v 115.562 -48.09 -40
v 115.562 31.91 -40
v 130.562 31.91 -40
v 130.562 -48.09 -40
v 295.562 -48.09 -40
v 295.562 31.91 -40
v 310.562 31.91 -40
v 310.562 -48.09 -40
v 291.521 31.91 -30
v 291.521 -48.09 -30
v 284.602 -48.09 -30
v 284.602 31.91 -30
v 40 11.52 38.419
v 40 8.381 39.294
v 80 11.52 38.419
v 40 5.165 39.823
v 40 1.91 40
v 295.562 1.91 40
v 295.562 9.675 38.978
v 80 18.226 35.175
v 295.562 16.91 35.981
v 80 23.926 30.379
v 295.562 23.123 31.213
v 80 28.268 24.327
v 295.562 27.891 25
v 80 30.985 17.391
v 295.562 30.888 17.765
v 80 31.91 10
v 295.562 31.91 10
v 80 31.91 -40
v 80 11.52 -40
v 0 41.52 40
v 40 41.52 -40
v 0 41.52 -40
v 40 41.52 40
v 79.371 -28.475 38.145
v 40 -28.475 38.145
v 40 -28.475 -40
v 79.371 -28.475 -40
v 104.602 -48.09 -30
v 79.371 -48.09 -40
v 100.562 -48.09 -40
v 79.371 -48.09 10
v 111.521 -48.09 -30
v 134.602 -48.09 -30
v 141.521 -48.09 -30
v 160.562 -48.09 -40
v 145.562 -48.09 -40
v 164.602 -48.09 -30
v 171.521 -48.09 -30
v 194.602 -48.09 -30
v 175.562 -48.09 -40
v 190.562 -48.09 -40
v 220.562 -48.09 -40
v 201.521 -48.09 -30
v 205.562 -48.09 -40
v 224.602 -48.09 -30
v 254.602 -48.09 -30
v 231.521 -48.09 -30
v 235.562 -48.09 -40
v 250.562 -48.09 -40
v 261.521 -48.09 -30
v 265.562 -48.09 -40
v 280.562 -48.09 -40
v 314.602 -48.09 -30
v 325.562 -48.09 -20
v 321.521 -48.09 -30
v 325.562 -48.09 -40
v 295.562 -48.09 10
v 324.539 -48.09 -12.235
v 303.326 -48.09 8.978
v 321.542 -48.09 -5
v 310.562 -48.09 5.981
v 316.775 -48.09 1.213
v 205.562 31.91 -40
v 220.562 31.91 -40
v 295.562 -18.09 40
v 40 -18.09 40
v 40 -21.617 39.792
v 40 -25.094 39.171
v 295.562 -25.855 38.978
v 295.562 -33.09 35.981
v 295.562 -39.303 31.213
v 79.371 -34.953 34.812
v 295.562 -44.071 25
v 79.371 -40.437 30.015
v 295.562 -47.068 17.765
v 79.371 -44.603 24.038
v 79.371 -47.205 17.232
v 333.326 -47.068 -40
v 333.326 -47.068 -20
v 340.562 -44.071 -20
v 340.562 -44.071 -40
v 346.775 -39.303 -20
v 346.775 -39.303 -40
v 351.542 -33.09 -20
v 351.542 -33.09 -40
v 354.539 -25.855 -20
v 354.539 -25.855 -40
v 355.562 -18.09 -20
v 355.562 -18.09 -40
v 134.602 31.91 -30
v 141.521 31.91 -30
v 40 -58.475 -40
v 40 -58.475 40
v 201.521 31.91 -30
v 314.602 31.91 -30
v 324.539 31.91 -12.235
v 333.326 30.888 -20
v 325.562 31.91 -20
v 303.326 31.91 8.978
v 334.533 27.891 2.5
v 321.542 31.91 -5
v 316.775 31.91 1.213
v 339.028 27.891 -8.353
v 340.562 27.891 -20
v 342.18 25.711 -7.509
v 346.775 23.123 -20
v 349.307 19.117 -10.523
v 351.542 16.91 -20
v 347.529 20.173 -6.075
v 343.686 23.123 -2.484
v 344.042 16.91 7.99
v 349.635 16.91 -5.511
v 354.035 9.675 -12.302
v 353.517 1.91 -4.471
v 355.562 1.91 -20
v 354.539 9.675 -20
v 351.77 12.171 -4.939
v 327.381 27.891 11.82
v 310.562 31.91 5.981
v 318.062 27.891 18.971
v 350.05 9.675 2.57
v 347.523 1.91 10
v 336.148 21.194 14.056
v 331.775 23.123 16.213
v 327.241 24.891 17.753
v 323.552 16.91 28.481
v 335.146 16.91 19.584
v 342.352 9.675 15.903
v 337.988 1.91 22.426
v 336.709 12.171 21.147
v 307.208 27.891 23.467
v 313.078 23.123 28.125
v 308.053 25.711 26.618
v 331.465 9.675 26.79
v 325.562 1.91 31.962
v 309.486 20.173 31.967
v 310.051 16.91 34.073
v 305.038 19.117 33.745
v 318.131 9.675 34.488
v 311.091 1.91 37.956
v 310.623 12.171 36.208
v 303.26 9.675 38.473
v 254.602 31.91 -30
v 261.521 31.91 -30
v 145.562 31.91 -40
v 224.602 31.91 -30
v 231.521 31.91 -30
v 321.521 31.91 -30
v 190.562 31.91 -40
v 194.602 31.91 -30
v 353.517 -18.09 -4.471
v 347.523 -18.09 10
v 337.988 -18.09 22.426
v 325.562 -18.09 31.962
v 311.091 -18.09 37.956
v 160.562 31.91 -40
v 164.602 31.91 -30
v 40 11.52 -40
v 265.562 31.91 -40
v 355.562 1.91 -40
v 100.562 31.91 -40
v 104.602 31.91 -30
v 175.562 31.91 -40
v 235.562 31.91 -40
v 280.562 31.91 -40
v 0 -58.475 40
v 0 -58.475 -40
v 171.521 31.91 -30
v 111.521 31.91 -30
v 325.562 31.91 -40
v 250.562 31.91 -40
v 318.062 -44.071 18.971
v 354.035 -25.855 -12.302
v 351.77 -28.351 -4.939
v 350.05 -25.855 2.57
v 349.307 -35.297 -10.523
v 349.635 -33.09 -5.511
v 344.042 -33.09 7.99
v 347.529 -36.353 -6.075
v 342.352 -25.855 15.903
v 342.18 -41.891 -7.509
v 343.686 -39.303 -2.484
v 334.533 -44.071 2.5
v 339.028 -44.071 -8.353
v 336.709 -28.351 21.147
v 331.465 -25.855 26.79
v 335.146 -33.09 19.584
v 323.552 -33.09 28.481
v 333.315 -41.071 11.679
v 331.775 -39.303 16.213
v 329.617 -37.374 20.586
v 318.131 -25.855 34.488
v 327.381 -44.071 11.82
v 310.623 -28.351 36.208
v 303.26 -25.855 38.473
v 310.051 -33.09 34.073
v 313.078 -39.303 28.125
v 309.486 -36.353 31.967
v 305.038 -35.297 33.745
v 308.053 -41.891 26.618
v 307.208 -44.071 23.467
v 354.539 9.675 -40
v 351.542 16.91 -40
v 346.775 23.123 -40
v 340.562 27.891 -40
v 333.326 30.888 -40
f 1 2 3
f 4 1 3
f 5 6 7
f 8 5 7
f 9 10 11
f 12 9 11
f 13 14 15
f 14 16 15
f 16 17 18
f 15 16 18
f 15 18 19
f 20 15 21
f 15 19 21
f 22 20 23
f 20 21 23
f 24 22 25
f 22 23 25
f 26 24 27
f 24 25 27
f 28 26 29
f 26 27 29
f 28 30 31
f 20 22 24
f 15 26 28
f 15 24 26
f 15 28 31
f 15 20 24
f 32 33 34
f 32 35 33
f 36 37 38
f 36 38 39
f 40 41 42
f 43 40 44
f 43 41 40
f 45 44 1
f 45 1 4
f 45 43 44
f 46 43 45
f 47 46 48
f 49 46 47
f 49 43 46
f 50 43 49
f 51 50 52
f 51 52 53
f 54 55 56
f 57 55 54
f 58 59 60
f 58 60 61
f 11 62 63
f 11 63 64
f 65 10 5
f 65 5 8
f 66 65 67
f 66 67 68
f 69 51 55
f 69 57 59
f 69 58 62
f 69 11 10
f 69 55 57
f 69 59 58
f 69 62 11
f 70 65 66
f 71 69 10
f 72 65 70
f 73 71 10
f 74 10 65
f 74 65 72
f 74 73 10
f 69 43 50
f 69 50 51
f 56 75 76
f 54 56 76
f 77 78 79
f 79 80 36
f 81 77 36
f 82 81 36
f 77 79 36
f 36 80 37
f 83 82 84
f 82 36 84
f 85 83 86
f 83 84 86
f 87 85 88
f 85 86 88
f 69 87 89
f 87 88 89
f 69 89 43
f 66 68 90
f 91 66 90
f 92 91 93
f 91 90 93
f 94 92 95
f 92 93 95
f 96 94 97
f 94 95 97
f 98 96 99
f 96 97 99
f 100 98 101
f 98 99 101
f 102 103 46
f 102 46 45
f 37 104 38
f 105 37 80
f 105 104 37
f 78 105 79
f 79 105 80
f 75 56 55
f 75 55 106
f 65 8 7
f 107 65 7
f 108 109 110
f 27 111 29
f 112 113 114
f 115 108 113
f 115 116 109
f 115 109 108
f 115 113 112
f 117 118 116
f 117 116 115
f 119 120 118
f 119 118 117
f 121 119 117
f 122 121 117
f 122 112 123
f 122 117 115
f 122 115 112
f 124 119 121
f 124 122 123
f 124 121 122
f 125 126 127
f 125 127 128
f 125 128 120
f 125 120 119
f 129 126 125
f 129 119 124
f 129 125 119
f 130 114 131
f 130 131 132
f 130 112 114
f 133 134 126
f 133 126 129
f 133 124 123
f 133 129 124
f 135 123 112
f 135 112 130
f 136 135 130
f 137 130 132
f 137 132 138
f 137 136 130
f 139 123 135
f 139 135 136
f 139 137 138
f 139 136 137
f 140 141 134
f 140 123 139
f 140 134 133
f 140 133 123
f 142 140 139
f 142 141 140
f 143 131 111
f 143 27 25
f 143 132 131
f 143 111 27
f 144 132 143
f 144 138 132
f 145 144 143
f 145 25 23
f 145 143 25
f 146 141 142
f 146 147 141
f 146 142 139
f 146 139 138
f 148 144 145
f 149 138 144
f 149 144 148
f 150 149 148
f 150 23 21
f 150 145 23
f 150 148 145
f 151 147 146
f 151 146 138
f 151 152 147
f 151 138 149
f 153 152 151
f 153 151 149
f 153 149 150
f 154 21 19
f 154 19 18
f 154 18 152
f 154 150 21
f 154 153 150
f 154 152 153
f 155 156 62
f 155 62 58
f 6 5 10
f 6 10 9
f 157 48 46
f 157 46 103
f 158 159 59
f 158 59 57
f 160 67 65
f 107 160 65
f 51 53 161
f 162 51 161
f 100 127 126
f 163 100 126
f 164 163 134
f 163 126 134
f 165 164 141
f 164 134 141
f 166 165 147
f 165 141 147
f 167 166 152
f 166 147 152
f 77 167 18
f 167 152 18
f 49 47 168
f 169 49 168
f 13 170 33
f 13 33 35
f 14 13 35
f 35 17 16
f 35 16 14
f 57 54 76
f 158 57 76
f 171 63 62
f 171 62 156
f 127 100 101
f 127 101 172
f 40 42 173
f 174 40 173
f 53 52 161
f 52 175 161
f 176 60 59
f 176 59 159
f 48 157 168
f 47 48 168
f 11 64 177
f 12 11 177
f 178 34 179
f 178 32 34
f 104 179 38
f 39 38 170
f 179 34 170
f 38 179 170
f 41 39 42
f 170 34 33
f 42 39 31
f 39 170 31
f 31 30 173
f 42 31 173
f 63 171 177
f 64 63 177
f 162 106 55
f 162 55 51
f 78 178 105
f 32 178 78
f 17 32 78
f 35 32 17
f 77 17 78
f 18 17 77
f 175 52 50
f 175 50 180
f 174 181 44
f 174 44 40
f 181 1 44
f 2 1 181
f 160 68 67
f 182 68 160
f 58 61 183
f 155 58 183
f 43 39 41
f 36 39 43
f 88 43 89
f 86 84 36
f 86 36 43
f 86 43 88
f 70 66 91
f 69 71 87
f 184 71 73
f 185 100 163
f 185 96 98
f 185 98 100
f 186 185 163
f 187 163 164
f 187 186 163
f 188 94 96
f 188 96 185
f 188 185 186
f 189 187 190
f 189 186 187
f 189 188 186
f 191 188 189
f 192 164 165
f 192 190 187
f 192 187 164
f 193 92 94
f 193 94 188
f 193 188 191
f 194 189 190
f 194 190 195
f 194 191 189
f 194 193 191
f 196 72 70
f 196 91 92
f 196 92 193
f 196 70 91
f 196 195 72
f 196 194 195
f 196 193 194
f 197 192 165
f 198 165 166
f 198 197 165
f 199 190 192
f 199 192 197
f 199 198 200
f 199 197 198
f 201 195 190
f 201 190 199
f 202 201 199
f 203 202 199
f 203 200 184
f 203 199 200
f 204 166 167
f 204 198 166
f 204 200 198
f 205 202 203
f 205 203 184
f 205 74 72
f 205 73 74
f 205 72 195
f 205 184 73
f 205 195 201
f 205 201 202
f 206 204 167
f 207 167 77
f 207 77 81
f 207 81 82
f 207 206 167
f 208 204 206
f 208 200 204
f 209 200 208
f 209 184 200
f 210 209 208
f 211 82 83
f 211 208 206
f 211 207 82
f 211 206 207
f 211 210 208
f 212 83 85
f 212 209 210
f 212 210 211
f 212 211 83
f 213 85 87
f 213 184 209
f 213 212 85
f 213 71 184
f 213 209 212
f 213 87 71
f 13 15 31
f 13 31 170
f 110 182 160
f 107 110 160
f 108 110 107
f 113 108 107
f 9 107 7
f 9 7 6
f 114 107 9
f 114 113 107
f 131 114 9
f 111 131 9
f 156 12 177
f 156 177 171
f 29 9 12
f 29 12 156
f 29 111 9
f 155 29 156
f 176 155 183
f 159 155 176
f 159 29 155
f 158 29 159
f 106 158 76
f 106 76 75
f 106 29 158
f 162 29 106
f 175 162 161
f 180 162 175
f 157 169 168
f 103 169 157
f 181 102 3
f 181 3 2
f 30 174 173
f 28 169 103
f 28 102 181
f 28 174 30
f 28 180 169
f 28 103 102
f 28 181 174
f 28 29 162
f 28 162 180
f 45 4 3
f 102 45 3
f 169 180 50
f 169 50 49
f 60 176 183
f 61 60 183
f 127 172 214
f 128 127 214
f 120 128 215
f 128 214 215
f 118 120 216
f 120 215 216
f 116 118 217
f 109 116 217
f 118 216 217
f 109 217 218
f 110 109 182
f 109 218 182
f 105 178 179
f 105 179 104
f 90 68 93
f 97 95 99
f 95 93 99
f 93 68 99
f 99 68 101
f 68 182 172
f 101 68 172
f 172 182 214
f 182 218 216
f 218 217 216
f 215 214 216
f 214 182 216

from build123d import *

# Parameters (mm, degrees)
BOSS_EXTRUDE1_DEPTH          = 40
FILLET1_R                    = 60
FILLET2_R                    = 30
SKETCH3_W                    = 15
SKETCH3_H                    = 109.922704731
CUT_EXTRUDE1_DEPTH           = 10
CUT_EXTRUDE1_DRAFT           = -22
CUT_EXTRUDE1_PROFILE_2_DEPTH = 10
CUT_EXTRUDE1_PROFILE_2_DRAFT = -22
CUT_EXTRUDE1_PROFILE_3_DEPTH = 10
CUT_EXTRUDE1_PROFILE_3_DRAFT = -22
CUT_EXTRUDE1_PROFILE_4_DEPTH = 10
CUT_EXTRUDE1_PROFILE_4_DRAFT = -22
CUT_EXTRUDE1_PROFILE_5_DEPTH = 10
CUT_EXTRUDE1_PROFILE_5_DRAFT = -22
CUT_EXTRUDE1_PROFILE_6_DEPTH = 10
CUT_EXTRUDE1_PROFILE_6_DRAFT = -22
CUT_EXTRUDE1_PROFILE_7_DEPTH = 10
CUT_EXTRUDE1_PROFILE_7_DRAFT = -22
CUT_EXTRUDE1_PROFILE_8_DEPTH = 10
CUT_EXTRUDE1_PROFILE_8_DRAFT = -22


with BuildPart() as part:
    # Sketch1 → Boss-Extrude1 (new, symmetric)
    with BuildSketch(Plane.XY):
        Polygon((0, 41.520471033), (0, -58.474576271), (40, -58.474576271), (40, -28.474576271), (79.370562847, -28.474576271), (79.370562847, -48.090018927), (355.561633386, -48.090018927), (355.561633386, -28.474576271), (355.561633386, 11.525423729), (355.561633386, 31.909981073), (80, 31.909981073), (80, 11.520471033), (40, 11.520471033), (40, 41.520471033), align=None)
    extrude(amount=BOSS_EXTRUDE1_DEPTH, both=True)

    # Fillet1
    fillet1_edges = [part.edges().sort_by_distance(p)[0] for p in [
        (355.561633386, -8.090018927, 40),
    ]]
    fillet(fillet1_edges, radius=FILLET1_R)

    # Fillet2
    # the kernel refuses this fillet: 30 mm, written as the material it takes off along each edge
    with BuildSketch(Plane(origin=(355.561633386, -48.090018927, -115), x_dir=(0, 1, 0), z_dir=(0, 0, 1)), Plane(origin=(355.561633386, 31.909981073, -115), x_dir=(-1, 0, 0), z_dir=(0, 0, 1))) as fillet2_piece_1:
        with BuildLine():
            CenterArc((FILLET2_R, FILLET2_R), FILLET2_R, 180, 90)
            Line((0, FILLET2_R), (0, 0))
            Line((0, 0), (FILLET2_R, 0))
        make_face()
    extrude(amount=95, mode=Mode.SUBTRACT)
    with BuildSketch(Plane(origin=(295.561633386, -48.090018927, -20), x_dir=(1, 0, 0), z_dir=(0, 0, -1))) as fillet2_piece_2:
        with BuildLine():
            CenterArc((60 - FILLET2_R, -FILLET2_R), FILLET2_R, 0, 90)
            Line((60 - FILLET2_R, 0), (60, 0))
            Line((60, 0), (60, -FILLET2_R))
        make_face()
    revolve(axis=Axis((295.561633386, -48.090018927, -20), (0, -1, 0)), revolution_arc=90, mode=Mode.SUBTRACT)
    with BuildSketch(Plane(origin=(295.561633386, 31.909981073, -20), x_dir=(1, 0, 0), z_dir=(0, 0, -1))) as fillet2_piece_3:
        with BuildLine():
            CenterArc((60 - FILLET2_R, FILLET2_R), FILLET2_R, 270, 90)
            Line((60, FILLET2_R), (60, 0))
            Line((60, 0), (60 - FILLET2_R, 0))
        make_face()
    revolve(axis=Axis((295.561633386, 31.909981073, -20), (0, -1, 0)), revolution_arc=90, mode=Mode.SUBTRACT)
    with BuildSketch(Plane(origin=(4.370562847, -48.090018927, 40), x_dir=(0, 1, 0), z_dir=(1, 0, 0))) as fillet2_piece_4_section:
        with BuildLine():
            CenterArc((FILLET2_R, -FILLET2_R), FILLET2_R, 90, 90)
            Line((0, -FILLET2_R), (0, 0))
            Line((0, 0), (FILLET2_R, 0))
        make_face()
    fillet2_piece_4 = extrude(amount=291.191070539, mode=Mode.PRIVATE)
    fillet2_piece_4 = split(fillet2_piece_4, bisect_by=Plane(origin=(40, -25.894757841, 39.446684124), z_dir=(1, 0, 0)), keep=Keep.TOP, mode=Mode.PRIVATE)
    add(fillet2_piece_4, mode=Mode.SUBTRACT)
    with BuildSketch(Plane(origin=(295.561633386, 31.909981073, 40), x_dir=(0, 0, -1), z_dir=(-1, 0, 0))) as fillet2_piece_5_section:
        with BuildLine():
            CenterArc((FILLET2_R, FILLET2_R), FILLET2_R, 180, 90)
            Line((0, FILLET2_R), (0, 0))
            Line((0, 0), (FILLET2_R, 0))
        make_face()
    fillet2_piece_5 = extrude(amount=290.561633386, mode=Mode.PRIVATE)
    fillet2_piece_5 = split(fillet2_piece_5, bisect_by=Plane(origin=(40, 26.935715602, 30.794780606), z_dir=(1, 0, 0)), keep=Keep.TOP, mode=Mode.PRIVATE)
    add(fillet2_piece_5, mode=Mode.SUBTRACT)


with BuildPart() as cut_extrude1_tool:
    # Sketch3 → Cut-Extrude1 (with draft: the straight prism first)
    with BuildSketch(Plane(origin=(0, 0, -40), x_dir=(-1, 0, 0), z_dir=(0, 0, -1))):
        with Locations((-318.061633386, -9.051561529)):
            Rectangle(SKETCH3_W, SKETCH3_H)
    extrude(amount=-CUT_EXTRUDE1_DEPTH)
    # Cut-Extrude1: the draft: its side faces are tilted about the plane it starts from
    cut_extrude1_sides = [cut_extrude1_tool.faces().sort_by_distance(p)[0] for p in [
        (325.561633386, -9.051561529, -35),
        (318.061633386, -64.012913894, -35),
        (310.561633386, -9.051561529, -35),
        (318.061633386, 45.909790837, -35),
    ]]
    draft(cut_extrude1_sides, Plane(origin=(0, 0, -40), x_dir=(-1, 0, 0), z_dir=(0, 0, -1)), CUT_EXTRUDE1_DRAFT)


with BuildPart() as part_1:
    add(part.part)

    # Cut-Extrude1: cut by cut_extrude1_tool
    add(cut_extrude1_tool.part, mode=Mode.SUBTRACT)


with BuildPart() as cut_extrude1_profile_2_tool:
    # Sketch3 → Cut-Extrude1 profile 2 (with draft: the straight prism first)
    with BuildSketch(Plane(origin=(0, 0, -40), x_dir=(-1, 0, 0), z_dir=(0, 0, -1))):
        with Locations((-288.061633386, -9.051561529)):
            Rectangle(SKETCH3_W, SKETCH3_H)
    extrude(amount=-CUT_EXTRUDE1_PROFILE_2_DEPTH)
    # Cut-Extrude1 profile 2: the draft: its side faces are tilted about the plane it starts from
    cut_extrude1_profile_2_sides = [cut_extrude1_profile_2_tool.faces().sort_by_distance(p)[0] for p in [
        (295.561633386, -9.051561529, -35),
        (288.061633386, -64.012913894, -35),
        (280.561633386, -9.051561529, -35),
        (288.061633386, 45.909790837, -35),
    ]]
    draft(cut_extrude1_profile_2_sides, Plane(origin=(0, 0, -40), x_dir=(-1, 0, 0), z_dir=(0, 0, -1)), CUT_EXTRUDE1_PROFILE_2_DRAFT)


with BuildPart() as part_2:
    add(part_1.part)

    # Cut-Extrude1 profile 2: cut by cut_extrude1_profile_2_tool
    add(cut_extrude1_profile_2_tool.part, mode=Mode.SUBTRACT)


with BuildPart() as cut_extrude1_profile_3_tool:
    # Sketch3 → Cut-Extrude1 profile 3 (with draft: the straight prism first)
    with BuildSketch(Plane(origin=(0, 0, -40), x_dir=(-1, 0, 0), z_dir=(0, 0, -1))):
        with Locations((-258.061633386, -9.051561529)):
            Rectangle(SKETCH3_W, SKETCH3_H)
    extrude(amount=-CUT_EXTRUDE1_PROFILE_3_DEPTH)
    # Cut-Extrude1 profile 3: the draft: its side faces are tilted about the plane it starts from
    cut_extrude1_profile_3_sides = [cut_extrude1_profile_3_tool.faces().sort_by_distance(p)[0] for p in [
        (265.561633386, -9.051561529, -35),
        (258.061633386, -64.012913894, -35),
        (250.561633386, -9.051561529, -35),
        (258.061633386, 45.909790837, -35),
    ]]
    draft(cut_extrude1_profile_3_sides, Plane(origin=(0, 0, -40), x_dir=(-1, 0, 0), z_dir=(0, 0, -1)), CUT_EXTRUDE1_PROFILE_3_DRAFT)


with BuildPart() as part_3:
    add(part_2.part)

    # Cut-Extrude1 profile 3: cut by cut_extrude1_profile_3_tool
    add(cut_extrude1_profile_3_tool.part, mode=Mode.SUBTRACT)


with BuildPart() as cut_extrude1_profile_4_tool:
    # Sketch3 → Cut-Extrude1 profile 4 (with draft: the straight prism first)
    with BuildSketch(Plane(origin=(0, 0, -40), x_dir=(-1, 0, 0), z_dir=(0, 0, -1))):
        with Locations((-228.061633386, -9.051561529)):
            Rectangle(SKETCH3_W, SKETCH3_H)
    extrude(amount=-CUT_EXTRUDE1_PROFILE_4_DEPTH)
    # Cut-Extrude1 profile 4: the draft: its side faces are tilted about the plane it starts from
    cut_extrude1_profile_4_sides = [cut_extrude1_profile_4_tool.faces().sort_by_distance(p)[0] for p in [
        (235.561633386, -9.051561529, -35),
        (228.061633386, -64.012913894, -35),
        (220.561633386, -9.051561529, -35),
        (228.061633386, 45.909790837, -35),
    ]]
    draft(cut_extrude1_profile_4_sides, Plane(origin=(0, 0, -40), x_dir=(-1, 0, 0), z_dir=(0, 0, -1)), CUT_EXTRUDE1_PROFILE_4_DRAFT)


with BuildPart() as part_4:
    add(part_3.part)

    # Cut-Extrude1 profile 4: cut by cut_extrude1_profile_4_tool
    add(cut_extrude1_profile_4_tool.part, mode=Mode.SUBTRACT)


with BuildPart() as cut_extrude1_profile_5_tool:
    # Sketch3 → Cut-Extrude1 profile 5 (with draft: the straight prism first)
    with BuildSketch(Plane(origin=(0, 0, -40), x_dir=(-1, 0, 0), z_dir=(0, 0, -1))):
        with Locations((-198.061633386, -9.051561529)):
            Rectangle(SKETCH3_W, SKETCH3_H)
    extrude(amount=-CUT_EXTRUDE1_PROFILE_5_DEPTH)
    # Cut-Extrude1 profile 5: the draft: its side faces are tilted about the plane it starts from
    cut_extrude1_profile_5_sides = [cut_extrude1_profile_5_tool.faces().sort_by_distance(p)[0] for p in [
        (205.561633386, -9.051561529, -35),
        (198.061633386, -64.012913894, -35),
        (190.561633386, -9.051561529, -35),
        (198.061633386, 45.909790837, -35),
    ]]
    draft(cut_extrude1_profile_5_sides, Plane(origin=(0, 0, -40), x_dir=(-1, 0, 0), z_dir=(0, 0, -1)), CUT_EXTRUDE1_PROFILE_5_DRAFT)


with BuildPart() as part_5:
    add(part_4.part)

    # Cut-Extrude1 profile 5: cut by cut_extrude1_profile_5_tool
    add(cut_extrude1_profile_5_tool.part, mode=Mode.SUBTRACT)


with BuildPart() as cut_extrude1_profile_6_tool:
    # Sketch3 → Cut-Extrude1 profile 6 (with draft: the straight prism first)
    with BuildSketch(Plane(origin=(0, 0, -40), x_dir=(-1, 0, 0), z_dir=(0, 0, -1))):
        with Locations((-168.061633386, -9.051561529)):
            Rectangle(SKETCH3_W, SKETCH3_H)
    extrude(amount=-CUT_EXTRUDE1_PROFILE_6_DEPTH)
    # Cut-Extrude1 profile 6: the draft: its side faces are tilted about the plane it starts from
    cut_extrude1_profile_6_sides = [cut_extrude1_profile_6_tool.faces().sort_by_distance(p)[0] for p in [
        (175.561633386, -9.051561529, -35),
        (168.061633386, -64.012913894, -35),
        (160.561633386, -9.051561529, -35),
        (168.061633386, 45.909790837, -35),
    ]]
    draft(cut_extrude1_profile_6_sides, Plane(origin=(0, 0, -40), x_dir=(-1, 0, 0), z_dir=(0, 0, -1)), CUT_EXTRUDE1_PROFILE_6_DRAFT)


with BuildPart() as part_6:
    add(part_5.part)

    # Cut-Extrude1 profile 6: cut by cut_extrude1_profile_6_tool
    add(cut_extrude1_profile_6_tool.part, mode=Mode.SUBTRACT)


with BuildPart() as cut_extrude1_profile_7_tool:
    # Sketch3 → Cut-Extrude1 profile 7 (with draft: the straight prism first)
    with BuildSketch(Plane(origin=(0, 0, -40), x_dir=(-1, 0, 0), z_dir=(0, 0, -1))):
        with Locations((-138.061633386, -9.051561529)):
            Rectangle(SKETCH3_W, SKETCH3_H)
    extrude(amount=-CUT_EXTRUDE1_PROFILE_7_DEPTH)
    # Cut-Extrude1 profile 7: the draft: its side faces are tilted about the plane it starts from
    cut_extrude1_profile_7_sides = [cut_extrude1_profile_7_tool.faces().sort_by_distance(p)[0] for p in [
        (145.561633386, -9.051561529, -35),
        (138.061633386, -64.012913894, -35),
        (130.561633386, -9.051561529, -35),
        (138.061633386, 45.909790837, -35),
    ]]
    draft(cut_extrude1_profile_7_sides, Plane(origin=(0, 0, -40), x_dir=(-1, 0, 0), z_dir=(0, 0, -1)), CUT_EXTRUDE1_PROFILE_7_DRAFT)


with BuildPart() as part_7:
    add(part_6.part)

    # Cut-Extrude1 profile 7: cut by cut_extrude1_profile_7_tool
    add(cut_extrude1_profile_7_tool.part, mode=Mode.SUBTRACT)


with BuildPart() as cut_extrude1_profile_8_tool:
    # Sketch3 → Cut-Extrude1 profile 8 (with draft: the straight prism first)
    with BuildSketch(Plane(origin=(0, 0, -40), x_dir=(-1, 0, 0), z_dir=(0, 0, -1))):
        with Locations((-108.061633386, -9.051561529)):
            Rectangle(SKETCH3_W, SKETCH3_H)
    extrude(amount=-CUT_EXTRUDE1_PROFILE_8_DEPTH)
    # Cut-Extrude1 profile 8: the draft: its side faces are tilted about the plane it starts from
    cut_extrude1_profile_8_sides = [cut_extrude1_profile_8_tool.faces().sort_by_distance(p)[0] for p in [
        (115.561633386, -9.051561529, -35),
        (108.061633386, -64.012913894, -35),
        (100.561633386, -9.051561529, -35),
        (108.061633386, 45.909790837, -35),
    ]]
    draft(cut_extrude1_profile_8_sides, Plane(origin=(0, 0, -40), x_dir=(-1, 0, 0), z_dir=(0, 0, -1)), CUT_EXTRUDE1_PROFILE_8_DRAFT)


with BuildPart() as part_8:
    add(part_7.part)

    # Cut-Extrude1 profile 8: cut by cut_extrude1_profile_8_tool
    add(cut_extrude1_profile_8_tool.part, mode=Mode.SUBTRACT)


solid = part_8.part
